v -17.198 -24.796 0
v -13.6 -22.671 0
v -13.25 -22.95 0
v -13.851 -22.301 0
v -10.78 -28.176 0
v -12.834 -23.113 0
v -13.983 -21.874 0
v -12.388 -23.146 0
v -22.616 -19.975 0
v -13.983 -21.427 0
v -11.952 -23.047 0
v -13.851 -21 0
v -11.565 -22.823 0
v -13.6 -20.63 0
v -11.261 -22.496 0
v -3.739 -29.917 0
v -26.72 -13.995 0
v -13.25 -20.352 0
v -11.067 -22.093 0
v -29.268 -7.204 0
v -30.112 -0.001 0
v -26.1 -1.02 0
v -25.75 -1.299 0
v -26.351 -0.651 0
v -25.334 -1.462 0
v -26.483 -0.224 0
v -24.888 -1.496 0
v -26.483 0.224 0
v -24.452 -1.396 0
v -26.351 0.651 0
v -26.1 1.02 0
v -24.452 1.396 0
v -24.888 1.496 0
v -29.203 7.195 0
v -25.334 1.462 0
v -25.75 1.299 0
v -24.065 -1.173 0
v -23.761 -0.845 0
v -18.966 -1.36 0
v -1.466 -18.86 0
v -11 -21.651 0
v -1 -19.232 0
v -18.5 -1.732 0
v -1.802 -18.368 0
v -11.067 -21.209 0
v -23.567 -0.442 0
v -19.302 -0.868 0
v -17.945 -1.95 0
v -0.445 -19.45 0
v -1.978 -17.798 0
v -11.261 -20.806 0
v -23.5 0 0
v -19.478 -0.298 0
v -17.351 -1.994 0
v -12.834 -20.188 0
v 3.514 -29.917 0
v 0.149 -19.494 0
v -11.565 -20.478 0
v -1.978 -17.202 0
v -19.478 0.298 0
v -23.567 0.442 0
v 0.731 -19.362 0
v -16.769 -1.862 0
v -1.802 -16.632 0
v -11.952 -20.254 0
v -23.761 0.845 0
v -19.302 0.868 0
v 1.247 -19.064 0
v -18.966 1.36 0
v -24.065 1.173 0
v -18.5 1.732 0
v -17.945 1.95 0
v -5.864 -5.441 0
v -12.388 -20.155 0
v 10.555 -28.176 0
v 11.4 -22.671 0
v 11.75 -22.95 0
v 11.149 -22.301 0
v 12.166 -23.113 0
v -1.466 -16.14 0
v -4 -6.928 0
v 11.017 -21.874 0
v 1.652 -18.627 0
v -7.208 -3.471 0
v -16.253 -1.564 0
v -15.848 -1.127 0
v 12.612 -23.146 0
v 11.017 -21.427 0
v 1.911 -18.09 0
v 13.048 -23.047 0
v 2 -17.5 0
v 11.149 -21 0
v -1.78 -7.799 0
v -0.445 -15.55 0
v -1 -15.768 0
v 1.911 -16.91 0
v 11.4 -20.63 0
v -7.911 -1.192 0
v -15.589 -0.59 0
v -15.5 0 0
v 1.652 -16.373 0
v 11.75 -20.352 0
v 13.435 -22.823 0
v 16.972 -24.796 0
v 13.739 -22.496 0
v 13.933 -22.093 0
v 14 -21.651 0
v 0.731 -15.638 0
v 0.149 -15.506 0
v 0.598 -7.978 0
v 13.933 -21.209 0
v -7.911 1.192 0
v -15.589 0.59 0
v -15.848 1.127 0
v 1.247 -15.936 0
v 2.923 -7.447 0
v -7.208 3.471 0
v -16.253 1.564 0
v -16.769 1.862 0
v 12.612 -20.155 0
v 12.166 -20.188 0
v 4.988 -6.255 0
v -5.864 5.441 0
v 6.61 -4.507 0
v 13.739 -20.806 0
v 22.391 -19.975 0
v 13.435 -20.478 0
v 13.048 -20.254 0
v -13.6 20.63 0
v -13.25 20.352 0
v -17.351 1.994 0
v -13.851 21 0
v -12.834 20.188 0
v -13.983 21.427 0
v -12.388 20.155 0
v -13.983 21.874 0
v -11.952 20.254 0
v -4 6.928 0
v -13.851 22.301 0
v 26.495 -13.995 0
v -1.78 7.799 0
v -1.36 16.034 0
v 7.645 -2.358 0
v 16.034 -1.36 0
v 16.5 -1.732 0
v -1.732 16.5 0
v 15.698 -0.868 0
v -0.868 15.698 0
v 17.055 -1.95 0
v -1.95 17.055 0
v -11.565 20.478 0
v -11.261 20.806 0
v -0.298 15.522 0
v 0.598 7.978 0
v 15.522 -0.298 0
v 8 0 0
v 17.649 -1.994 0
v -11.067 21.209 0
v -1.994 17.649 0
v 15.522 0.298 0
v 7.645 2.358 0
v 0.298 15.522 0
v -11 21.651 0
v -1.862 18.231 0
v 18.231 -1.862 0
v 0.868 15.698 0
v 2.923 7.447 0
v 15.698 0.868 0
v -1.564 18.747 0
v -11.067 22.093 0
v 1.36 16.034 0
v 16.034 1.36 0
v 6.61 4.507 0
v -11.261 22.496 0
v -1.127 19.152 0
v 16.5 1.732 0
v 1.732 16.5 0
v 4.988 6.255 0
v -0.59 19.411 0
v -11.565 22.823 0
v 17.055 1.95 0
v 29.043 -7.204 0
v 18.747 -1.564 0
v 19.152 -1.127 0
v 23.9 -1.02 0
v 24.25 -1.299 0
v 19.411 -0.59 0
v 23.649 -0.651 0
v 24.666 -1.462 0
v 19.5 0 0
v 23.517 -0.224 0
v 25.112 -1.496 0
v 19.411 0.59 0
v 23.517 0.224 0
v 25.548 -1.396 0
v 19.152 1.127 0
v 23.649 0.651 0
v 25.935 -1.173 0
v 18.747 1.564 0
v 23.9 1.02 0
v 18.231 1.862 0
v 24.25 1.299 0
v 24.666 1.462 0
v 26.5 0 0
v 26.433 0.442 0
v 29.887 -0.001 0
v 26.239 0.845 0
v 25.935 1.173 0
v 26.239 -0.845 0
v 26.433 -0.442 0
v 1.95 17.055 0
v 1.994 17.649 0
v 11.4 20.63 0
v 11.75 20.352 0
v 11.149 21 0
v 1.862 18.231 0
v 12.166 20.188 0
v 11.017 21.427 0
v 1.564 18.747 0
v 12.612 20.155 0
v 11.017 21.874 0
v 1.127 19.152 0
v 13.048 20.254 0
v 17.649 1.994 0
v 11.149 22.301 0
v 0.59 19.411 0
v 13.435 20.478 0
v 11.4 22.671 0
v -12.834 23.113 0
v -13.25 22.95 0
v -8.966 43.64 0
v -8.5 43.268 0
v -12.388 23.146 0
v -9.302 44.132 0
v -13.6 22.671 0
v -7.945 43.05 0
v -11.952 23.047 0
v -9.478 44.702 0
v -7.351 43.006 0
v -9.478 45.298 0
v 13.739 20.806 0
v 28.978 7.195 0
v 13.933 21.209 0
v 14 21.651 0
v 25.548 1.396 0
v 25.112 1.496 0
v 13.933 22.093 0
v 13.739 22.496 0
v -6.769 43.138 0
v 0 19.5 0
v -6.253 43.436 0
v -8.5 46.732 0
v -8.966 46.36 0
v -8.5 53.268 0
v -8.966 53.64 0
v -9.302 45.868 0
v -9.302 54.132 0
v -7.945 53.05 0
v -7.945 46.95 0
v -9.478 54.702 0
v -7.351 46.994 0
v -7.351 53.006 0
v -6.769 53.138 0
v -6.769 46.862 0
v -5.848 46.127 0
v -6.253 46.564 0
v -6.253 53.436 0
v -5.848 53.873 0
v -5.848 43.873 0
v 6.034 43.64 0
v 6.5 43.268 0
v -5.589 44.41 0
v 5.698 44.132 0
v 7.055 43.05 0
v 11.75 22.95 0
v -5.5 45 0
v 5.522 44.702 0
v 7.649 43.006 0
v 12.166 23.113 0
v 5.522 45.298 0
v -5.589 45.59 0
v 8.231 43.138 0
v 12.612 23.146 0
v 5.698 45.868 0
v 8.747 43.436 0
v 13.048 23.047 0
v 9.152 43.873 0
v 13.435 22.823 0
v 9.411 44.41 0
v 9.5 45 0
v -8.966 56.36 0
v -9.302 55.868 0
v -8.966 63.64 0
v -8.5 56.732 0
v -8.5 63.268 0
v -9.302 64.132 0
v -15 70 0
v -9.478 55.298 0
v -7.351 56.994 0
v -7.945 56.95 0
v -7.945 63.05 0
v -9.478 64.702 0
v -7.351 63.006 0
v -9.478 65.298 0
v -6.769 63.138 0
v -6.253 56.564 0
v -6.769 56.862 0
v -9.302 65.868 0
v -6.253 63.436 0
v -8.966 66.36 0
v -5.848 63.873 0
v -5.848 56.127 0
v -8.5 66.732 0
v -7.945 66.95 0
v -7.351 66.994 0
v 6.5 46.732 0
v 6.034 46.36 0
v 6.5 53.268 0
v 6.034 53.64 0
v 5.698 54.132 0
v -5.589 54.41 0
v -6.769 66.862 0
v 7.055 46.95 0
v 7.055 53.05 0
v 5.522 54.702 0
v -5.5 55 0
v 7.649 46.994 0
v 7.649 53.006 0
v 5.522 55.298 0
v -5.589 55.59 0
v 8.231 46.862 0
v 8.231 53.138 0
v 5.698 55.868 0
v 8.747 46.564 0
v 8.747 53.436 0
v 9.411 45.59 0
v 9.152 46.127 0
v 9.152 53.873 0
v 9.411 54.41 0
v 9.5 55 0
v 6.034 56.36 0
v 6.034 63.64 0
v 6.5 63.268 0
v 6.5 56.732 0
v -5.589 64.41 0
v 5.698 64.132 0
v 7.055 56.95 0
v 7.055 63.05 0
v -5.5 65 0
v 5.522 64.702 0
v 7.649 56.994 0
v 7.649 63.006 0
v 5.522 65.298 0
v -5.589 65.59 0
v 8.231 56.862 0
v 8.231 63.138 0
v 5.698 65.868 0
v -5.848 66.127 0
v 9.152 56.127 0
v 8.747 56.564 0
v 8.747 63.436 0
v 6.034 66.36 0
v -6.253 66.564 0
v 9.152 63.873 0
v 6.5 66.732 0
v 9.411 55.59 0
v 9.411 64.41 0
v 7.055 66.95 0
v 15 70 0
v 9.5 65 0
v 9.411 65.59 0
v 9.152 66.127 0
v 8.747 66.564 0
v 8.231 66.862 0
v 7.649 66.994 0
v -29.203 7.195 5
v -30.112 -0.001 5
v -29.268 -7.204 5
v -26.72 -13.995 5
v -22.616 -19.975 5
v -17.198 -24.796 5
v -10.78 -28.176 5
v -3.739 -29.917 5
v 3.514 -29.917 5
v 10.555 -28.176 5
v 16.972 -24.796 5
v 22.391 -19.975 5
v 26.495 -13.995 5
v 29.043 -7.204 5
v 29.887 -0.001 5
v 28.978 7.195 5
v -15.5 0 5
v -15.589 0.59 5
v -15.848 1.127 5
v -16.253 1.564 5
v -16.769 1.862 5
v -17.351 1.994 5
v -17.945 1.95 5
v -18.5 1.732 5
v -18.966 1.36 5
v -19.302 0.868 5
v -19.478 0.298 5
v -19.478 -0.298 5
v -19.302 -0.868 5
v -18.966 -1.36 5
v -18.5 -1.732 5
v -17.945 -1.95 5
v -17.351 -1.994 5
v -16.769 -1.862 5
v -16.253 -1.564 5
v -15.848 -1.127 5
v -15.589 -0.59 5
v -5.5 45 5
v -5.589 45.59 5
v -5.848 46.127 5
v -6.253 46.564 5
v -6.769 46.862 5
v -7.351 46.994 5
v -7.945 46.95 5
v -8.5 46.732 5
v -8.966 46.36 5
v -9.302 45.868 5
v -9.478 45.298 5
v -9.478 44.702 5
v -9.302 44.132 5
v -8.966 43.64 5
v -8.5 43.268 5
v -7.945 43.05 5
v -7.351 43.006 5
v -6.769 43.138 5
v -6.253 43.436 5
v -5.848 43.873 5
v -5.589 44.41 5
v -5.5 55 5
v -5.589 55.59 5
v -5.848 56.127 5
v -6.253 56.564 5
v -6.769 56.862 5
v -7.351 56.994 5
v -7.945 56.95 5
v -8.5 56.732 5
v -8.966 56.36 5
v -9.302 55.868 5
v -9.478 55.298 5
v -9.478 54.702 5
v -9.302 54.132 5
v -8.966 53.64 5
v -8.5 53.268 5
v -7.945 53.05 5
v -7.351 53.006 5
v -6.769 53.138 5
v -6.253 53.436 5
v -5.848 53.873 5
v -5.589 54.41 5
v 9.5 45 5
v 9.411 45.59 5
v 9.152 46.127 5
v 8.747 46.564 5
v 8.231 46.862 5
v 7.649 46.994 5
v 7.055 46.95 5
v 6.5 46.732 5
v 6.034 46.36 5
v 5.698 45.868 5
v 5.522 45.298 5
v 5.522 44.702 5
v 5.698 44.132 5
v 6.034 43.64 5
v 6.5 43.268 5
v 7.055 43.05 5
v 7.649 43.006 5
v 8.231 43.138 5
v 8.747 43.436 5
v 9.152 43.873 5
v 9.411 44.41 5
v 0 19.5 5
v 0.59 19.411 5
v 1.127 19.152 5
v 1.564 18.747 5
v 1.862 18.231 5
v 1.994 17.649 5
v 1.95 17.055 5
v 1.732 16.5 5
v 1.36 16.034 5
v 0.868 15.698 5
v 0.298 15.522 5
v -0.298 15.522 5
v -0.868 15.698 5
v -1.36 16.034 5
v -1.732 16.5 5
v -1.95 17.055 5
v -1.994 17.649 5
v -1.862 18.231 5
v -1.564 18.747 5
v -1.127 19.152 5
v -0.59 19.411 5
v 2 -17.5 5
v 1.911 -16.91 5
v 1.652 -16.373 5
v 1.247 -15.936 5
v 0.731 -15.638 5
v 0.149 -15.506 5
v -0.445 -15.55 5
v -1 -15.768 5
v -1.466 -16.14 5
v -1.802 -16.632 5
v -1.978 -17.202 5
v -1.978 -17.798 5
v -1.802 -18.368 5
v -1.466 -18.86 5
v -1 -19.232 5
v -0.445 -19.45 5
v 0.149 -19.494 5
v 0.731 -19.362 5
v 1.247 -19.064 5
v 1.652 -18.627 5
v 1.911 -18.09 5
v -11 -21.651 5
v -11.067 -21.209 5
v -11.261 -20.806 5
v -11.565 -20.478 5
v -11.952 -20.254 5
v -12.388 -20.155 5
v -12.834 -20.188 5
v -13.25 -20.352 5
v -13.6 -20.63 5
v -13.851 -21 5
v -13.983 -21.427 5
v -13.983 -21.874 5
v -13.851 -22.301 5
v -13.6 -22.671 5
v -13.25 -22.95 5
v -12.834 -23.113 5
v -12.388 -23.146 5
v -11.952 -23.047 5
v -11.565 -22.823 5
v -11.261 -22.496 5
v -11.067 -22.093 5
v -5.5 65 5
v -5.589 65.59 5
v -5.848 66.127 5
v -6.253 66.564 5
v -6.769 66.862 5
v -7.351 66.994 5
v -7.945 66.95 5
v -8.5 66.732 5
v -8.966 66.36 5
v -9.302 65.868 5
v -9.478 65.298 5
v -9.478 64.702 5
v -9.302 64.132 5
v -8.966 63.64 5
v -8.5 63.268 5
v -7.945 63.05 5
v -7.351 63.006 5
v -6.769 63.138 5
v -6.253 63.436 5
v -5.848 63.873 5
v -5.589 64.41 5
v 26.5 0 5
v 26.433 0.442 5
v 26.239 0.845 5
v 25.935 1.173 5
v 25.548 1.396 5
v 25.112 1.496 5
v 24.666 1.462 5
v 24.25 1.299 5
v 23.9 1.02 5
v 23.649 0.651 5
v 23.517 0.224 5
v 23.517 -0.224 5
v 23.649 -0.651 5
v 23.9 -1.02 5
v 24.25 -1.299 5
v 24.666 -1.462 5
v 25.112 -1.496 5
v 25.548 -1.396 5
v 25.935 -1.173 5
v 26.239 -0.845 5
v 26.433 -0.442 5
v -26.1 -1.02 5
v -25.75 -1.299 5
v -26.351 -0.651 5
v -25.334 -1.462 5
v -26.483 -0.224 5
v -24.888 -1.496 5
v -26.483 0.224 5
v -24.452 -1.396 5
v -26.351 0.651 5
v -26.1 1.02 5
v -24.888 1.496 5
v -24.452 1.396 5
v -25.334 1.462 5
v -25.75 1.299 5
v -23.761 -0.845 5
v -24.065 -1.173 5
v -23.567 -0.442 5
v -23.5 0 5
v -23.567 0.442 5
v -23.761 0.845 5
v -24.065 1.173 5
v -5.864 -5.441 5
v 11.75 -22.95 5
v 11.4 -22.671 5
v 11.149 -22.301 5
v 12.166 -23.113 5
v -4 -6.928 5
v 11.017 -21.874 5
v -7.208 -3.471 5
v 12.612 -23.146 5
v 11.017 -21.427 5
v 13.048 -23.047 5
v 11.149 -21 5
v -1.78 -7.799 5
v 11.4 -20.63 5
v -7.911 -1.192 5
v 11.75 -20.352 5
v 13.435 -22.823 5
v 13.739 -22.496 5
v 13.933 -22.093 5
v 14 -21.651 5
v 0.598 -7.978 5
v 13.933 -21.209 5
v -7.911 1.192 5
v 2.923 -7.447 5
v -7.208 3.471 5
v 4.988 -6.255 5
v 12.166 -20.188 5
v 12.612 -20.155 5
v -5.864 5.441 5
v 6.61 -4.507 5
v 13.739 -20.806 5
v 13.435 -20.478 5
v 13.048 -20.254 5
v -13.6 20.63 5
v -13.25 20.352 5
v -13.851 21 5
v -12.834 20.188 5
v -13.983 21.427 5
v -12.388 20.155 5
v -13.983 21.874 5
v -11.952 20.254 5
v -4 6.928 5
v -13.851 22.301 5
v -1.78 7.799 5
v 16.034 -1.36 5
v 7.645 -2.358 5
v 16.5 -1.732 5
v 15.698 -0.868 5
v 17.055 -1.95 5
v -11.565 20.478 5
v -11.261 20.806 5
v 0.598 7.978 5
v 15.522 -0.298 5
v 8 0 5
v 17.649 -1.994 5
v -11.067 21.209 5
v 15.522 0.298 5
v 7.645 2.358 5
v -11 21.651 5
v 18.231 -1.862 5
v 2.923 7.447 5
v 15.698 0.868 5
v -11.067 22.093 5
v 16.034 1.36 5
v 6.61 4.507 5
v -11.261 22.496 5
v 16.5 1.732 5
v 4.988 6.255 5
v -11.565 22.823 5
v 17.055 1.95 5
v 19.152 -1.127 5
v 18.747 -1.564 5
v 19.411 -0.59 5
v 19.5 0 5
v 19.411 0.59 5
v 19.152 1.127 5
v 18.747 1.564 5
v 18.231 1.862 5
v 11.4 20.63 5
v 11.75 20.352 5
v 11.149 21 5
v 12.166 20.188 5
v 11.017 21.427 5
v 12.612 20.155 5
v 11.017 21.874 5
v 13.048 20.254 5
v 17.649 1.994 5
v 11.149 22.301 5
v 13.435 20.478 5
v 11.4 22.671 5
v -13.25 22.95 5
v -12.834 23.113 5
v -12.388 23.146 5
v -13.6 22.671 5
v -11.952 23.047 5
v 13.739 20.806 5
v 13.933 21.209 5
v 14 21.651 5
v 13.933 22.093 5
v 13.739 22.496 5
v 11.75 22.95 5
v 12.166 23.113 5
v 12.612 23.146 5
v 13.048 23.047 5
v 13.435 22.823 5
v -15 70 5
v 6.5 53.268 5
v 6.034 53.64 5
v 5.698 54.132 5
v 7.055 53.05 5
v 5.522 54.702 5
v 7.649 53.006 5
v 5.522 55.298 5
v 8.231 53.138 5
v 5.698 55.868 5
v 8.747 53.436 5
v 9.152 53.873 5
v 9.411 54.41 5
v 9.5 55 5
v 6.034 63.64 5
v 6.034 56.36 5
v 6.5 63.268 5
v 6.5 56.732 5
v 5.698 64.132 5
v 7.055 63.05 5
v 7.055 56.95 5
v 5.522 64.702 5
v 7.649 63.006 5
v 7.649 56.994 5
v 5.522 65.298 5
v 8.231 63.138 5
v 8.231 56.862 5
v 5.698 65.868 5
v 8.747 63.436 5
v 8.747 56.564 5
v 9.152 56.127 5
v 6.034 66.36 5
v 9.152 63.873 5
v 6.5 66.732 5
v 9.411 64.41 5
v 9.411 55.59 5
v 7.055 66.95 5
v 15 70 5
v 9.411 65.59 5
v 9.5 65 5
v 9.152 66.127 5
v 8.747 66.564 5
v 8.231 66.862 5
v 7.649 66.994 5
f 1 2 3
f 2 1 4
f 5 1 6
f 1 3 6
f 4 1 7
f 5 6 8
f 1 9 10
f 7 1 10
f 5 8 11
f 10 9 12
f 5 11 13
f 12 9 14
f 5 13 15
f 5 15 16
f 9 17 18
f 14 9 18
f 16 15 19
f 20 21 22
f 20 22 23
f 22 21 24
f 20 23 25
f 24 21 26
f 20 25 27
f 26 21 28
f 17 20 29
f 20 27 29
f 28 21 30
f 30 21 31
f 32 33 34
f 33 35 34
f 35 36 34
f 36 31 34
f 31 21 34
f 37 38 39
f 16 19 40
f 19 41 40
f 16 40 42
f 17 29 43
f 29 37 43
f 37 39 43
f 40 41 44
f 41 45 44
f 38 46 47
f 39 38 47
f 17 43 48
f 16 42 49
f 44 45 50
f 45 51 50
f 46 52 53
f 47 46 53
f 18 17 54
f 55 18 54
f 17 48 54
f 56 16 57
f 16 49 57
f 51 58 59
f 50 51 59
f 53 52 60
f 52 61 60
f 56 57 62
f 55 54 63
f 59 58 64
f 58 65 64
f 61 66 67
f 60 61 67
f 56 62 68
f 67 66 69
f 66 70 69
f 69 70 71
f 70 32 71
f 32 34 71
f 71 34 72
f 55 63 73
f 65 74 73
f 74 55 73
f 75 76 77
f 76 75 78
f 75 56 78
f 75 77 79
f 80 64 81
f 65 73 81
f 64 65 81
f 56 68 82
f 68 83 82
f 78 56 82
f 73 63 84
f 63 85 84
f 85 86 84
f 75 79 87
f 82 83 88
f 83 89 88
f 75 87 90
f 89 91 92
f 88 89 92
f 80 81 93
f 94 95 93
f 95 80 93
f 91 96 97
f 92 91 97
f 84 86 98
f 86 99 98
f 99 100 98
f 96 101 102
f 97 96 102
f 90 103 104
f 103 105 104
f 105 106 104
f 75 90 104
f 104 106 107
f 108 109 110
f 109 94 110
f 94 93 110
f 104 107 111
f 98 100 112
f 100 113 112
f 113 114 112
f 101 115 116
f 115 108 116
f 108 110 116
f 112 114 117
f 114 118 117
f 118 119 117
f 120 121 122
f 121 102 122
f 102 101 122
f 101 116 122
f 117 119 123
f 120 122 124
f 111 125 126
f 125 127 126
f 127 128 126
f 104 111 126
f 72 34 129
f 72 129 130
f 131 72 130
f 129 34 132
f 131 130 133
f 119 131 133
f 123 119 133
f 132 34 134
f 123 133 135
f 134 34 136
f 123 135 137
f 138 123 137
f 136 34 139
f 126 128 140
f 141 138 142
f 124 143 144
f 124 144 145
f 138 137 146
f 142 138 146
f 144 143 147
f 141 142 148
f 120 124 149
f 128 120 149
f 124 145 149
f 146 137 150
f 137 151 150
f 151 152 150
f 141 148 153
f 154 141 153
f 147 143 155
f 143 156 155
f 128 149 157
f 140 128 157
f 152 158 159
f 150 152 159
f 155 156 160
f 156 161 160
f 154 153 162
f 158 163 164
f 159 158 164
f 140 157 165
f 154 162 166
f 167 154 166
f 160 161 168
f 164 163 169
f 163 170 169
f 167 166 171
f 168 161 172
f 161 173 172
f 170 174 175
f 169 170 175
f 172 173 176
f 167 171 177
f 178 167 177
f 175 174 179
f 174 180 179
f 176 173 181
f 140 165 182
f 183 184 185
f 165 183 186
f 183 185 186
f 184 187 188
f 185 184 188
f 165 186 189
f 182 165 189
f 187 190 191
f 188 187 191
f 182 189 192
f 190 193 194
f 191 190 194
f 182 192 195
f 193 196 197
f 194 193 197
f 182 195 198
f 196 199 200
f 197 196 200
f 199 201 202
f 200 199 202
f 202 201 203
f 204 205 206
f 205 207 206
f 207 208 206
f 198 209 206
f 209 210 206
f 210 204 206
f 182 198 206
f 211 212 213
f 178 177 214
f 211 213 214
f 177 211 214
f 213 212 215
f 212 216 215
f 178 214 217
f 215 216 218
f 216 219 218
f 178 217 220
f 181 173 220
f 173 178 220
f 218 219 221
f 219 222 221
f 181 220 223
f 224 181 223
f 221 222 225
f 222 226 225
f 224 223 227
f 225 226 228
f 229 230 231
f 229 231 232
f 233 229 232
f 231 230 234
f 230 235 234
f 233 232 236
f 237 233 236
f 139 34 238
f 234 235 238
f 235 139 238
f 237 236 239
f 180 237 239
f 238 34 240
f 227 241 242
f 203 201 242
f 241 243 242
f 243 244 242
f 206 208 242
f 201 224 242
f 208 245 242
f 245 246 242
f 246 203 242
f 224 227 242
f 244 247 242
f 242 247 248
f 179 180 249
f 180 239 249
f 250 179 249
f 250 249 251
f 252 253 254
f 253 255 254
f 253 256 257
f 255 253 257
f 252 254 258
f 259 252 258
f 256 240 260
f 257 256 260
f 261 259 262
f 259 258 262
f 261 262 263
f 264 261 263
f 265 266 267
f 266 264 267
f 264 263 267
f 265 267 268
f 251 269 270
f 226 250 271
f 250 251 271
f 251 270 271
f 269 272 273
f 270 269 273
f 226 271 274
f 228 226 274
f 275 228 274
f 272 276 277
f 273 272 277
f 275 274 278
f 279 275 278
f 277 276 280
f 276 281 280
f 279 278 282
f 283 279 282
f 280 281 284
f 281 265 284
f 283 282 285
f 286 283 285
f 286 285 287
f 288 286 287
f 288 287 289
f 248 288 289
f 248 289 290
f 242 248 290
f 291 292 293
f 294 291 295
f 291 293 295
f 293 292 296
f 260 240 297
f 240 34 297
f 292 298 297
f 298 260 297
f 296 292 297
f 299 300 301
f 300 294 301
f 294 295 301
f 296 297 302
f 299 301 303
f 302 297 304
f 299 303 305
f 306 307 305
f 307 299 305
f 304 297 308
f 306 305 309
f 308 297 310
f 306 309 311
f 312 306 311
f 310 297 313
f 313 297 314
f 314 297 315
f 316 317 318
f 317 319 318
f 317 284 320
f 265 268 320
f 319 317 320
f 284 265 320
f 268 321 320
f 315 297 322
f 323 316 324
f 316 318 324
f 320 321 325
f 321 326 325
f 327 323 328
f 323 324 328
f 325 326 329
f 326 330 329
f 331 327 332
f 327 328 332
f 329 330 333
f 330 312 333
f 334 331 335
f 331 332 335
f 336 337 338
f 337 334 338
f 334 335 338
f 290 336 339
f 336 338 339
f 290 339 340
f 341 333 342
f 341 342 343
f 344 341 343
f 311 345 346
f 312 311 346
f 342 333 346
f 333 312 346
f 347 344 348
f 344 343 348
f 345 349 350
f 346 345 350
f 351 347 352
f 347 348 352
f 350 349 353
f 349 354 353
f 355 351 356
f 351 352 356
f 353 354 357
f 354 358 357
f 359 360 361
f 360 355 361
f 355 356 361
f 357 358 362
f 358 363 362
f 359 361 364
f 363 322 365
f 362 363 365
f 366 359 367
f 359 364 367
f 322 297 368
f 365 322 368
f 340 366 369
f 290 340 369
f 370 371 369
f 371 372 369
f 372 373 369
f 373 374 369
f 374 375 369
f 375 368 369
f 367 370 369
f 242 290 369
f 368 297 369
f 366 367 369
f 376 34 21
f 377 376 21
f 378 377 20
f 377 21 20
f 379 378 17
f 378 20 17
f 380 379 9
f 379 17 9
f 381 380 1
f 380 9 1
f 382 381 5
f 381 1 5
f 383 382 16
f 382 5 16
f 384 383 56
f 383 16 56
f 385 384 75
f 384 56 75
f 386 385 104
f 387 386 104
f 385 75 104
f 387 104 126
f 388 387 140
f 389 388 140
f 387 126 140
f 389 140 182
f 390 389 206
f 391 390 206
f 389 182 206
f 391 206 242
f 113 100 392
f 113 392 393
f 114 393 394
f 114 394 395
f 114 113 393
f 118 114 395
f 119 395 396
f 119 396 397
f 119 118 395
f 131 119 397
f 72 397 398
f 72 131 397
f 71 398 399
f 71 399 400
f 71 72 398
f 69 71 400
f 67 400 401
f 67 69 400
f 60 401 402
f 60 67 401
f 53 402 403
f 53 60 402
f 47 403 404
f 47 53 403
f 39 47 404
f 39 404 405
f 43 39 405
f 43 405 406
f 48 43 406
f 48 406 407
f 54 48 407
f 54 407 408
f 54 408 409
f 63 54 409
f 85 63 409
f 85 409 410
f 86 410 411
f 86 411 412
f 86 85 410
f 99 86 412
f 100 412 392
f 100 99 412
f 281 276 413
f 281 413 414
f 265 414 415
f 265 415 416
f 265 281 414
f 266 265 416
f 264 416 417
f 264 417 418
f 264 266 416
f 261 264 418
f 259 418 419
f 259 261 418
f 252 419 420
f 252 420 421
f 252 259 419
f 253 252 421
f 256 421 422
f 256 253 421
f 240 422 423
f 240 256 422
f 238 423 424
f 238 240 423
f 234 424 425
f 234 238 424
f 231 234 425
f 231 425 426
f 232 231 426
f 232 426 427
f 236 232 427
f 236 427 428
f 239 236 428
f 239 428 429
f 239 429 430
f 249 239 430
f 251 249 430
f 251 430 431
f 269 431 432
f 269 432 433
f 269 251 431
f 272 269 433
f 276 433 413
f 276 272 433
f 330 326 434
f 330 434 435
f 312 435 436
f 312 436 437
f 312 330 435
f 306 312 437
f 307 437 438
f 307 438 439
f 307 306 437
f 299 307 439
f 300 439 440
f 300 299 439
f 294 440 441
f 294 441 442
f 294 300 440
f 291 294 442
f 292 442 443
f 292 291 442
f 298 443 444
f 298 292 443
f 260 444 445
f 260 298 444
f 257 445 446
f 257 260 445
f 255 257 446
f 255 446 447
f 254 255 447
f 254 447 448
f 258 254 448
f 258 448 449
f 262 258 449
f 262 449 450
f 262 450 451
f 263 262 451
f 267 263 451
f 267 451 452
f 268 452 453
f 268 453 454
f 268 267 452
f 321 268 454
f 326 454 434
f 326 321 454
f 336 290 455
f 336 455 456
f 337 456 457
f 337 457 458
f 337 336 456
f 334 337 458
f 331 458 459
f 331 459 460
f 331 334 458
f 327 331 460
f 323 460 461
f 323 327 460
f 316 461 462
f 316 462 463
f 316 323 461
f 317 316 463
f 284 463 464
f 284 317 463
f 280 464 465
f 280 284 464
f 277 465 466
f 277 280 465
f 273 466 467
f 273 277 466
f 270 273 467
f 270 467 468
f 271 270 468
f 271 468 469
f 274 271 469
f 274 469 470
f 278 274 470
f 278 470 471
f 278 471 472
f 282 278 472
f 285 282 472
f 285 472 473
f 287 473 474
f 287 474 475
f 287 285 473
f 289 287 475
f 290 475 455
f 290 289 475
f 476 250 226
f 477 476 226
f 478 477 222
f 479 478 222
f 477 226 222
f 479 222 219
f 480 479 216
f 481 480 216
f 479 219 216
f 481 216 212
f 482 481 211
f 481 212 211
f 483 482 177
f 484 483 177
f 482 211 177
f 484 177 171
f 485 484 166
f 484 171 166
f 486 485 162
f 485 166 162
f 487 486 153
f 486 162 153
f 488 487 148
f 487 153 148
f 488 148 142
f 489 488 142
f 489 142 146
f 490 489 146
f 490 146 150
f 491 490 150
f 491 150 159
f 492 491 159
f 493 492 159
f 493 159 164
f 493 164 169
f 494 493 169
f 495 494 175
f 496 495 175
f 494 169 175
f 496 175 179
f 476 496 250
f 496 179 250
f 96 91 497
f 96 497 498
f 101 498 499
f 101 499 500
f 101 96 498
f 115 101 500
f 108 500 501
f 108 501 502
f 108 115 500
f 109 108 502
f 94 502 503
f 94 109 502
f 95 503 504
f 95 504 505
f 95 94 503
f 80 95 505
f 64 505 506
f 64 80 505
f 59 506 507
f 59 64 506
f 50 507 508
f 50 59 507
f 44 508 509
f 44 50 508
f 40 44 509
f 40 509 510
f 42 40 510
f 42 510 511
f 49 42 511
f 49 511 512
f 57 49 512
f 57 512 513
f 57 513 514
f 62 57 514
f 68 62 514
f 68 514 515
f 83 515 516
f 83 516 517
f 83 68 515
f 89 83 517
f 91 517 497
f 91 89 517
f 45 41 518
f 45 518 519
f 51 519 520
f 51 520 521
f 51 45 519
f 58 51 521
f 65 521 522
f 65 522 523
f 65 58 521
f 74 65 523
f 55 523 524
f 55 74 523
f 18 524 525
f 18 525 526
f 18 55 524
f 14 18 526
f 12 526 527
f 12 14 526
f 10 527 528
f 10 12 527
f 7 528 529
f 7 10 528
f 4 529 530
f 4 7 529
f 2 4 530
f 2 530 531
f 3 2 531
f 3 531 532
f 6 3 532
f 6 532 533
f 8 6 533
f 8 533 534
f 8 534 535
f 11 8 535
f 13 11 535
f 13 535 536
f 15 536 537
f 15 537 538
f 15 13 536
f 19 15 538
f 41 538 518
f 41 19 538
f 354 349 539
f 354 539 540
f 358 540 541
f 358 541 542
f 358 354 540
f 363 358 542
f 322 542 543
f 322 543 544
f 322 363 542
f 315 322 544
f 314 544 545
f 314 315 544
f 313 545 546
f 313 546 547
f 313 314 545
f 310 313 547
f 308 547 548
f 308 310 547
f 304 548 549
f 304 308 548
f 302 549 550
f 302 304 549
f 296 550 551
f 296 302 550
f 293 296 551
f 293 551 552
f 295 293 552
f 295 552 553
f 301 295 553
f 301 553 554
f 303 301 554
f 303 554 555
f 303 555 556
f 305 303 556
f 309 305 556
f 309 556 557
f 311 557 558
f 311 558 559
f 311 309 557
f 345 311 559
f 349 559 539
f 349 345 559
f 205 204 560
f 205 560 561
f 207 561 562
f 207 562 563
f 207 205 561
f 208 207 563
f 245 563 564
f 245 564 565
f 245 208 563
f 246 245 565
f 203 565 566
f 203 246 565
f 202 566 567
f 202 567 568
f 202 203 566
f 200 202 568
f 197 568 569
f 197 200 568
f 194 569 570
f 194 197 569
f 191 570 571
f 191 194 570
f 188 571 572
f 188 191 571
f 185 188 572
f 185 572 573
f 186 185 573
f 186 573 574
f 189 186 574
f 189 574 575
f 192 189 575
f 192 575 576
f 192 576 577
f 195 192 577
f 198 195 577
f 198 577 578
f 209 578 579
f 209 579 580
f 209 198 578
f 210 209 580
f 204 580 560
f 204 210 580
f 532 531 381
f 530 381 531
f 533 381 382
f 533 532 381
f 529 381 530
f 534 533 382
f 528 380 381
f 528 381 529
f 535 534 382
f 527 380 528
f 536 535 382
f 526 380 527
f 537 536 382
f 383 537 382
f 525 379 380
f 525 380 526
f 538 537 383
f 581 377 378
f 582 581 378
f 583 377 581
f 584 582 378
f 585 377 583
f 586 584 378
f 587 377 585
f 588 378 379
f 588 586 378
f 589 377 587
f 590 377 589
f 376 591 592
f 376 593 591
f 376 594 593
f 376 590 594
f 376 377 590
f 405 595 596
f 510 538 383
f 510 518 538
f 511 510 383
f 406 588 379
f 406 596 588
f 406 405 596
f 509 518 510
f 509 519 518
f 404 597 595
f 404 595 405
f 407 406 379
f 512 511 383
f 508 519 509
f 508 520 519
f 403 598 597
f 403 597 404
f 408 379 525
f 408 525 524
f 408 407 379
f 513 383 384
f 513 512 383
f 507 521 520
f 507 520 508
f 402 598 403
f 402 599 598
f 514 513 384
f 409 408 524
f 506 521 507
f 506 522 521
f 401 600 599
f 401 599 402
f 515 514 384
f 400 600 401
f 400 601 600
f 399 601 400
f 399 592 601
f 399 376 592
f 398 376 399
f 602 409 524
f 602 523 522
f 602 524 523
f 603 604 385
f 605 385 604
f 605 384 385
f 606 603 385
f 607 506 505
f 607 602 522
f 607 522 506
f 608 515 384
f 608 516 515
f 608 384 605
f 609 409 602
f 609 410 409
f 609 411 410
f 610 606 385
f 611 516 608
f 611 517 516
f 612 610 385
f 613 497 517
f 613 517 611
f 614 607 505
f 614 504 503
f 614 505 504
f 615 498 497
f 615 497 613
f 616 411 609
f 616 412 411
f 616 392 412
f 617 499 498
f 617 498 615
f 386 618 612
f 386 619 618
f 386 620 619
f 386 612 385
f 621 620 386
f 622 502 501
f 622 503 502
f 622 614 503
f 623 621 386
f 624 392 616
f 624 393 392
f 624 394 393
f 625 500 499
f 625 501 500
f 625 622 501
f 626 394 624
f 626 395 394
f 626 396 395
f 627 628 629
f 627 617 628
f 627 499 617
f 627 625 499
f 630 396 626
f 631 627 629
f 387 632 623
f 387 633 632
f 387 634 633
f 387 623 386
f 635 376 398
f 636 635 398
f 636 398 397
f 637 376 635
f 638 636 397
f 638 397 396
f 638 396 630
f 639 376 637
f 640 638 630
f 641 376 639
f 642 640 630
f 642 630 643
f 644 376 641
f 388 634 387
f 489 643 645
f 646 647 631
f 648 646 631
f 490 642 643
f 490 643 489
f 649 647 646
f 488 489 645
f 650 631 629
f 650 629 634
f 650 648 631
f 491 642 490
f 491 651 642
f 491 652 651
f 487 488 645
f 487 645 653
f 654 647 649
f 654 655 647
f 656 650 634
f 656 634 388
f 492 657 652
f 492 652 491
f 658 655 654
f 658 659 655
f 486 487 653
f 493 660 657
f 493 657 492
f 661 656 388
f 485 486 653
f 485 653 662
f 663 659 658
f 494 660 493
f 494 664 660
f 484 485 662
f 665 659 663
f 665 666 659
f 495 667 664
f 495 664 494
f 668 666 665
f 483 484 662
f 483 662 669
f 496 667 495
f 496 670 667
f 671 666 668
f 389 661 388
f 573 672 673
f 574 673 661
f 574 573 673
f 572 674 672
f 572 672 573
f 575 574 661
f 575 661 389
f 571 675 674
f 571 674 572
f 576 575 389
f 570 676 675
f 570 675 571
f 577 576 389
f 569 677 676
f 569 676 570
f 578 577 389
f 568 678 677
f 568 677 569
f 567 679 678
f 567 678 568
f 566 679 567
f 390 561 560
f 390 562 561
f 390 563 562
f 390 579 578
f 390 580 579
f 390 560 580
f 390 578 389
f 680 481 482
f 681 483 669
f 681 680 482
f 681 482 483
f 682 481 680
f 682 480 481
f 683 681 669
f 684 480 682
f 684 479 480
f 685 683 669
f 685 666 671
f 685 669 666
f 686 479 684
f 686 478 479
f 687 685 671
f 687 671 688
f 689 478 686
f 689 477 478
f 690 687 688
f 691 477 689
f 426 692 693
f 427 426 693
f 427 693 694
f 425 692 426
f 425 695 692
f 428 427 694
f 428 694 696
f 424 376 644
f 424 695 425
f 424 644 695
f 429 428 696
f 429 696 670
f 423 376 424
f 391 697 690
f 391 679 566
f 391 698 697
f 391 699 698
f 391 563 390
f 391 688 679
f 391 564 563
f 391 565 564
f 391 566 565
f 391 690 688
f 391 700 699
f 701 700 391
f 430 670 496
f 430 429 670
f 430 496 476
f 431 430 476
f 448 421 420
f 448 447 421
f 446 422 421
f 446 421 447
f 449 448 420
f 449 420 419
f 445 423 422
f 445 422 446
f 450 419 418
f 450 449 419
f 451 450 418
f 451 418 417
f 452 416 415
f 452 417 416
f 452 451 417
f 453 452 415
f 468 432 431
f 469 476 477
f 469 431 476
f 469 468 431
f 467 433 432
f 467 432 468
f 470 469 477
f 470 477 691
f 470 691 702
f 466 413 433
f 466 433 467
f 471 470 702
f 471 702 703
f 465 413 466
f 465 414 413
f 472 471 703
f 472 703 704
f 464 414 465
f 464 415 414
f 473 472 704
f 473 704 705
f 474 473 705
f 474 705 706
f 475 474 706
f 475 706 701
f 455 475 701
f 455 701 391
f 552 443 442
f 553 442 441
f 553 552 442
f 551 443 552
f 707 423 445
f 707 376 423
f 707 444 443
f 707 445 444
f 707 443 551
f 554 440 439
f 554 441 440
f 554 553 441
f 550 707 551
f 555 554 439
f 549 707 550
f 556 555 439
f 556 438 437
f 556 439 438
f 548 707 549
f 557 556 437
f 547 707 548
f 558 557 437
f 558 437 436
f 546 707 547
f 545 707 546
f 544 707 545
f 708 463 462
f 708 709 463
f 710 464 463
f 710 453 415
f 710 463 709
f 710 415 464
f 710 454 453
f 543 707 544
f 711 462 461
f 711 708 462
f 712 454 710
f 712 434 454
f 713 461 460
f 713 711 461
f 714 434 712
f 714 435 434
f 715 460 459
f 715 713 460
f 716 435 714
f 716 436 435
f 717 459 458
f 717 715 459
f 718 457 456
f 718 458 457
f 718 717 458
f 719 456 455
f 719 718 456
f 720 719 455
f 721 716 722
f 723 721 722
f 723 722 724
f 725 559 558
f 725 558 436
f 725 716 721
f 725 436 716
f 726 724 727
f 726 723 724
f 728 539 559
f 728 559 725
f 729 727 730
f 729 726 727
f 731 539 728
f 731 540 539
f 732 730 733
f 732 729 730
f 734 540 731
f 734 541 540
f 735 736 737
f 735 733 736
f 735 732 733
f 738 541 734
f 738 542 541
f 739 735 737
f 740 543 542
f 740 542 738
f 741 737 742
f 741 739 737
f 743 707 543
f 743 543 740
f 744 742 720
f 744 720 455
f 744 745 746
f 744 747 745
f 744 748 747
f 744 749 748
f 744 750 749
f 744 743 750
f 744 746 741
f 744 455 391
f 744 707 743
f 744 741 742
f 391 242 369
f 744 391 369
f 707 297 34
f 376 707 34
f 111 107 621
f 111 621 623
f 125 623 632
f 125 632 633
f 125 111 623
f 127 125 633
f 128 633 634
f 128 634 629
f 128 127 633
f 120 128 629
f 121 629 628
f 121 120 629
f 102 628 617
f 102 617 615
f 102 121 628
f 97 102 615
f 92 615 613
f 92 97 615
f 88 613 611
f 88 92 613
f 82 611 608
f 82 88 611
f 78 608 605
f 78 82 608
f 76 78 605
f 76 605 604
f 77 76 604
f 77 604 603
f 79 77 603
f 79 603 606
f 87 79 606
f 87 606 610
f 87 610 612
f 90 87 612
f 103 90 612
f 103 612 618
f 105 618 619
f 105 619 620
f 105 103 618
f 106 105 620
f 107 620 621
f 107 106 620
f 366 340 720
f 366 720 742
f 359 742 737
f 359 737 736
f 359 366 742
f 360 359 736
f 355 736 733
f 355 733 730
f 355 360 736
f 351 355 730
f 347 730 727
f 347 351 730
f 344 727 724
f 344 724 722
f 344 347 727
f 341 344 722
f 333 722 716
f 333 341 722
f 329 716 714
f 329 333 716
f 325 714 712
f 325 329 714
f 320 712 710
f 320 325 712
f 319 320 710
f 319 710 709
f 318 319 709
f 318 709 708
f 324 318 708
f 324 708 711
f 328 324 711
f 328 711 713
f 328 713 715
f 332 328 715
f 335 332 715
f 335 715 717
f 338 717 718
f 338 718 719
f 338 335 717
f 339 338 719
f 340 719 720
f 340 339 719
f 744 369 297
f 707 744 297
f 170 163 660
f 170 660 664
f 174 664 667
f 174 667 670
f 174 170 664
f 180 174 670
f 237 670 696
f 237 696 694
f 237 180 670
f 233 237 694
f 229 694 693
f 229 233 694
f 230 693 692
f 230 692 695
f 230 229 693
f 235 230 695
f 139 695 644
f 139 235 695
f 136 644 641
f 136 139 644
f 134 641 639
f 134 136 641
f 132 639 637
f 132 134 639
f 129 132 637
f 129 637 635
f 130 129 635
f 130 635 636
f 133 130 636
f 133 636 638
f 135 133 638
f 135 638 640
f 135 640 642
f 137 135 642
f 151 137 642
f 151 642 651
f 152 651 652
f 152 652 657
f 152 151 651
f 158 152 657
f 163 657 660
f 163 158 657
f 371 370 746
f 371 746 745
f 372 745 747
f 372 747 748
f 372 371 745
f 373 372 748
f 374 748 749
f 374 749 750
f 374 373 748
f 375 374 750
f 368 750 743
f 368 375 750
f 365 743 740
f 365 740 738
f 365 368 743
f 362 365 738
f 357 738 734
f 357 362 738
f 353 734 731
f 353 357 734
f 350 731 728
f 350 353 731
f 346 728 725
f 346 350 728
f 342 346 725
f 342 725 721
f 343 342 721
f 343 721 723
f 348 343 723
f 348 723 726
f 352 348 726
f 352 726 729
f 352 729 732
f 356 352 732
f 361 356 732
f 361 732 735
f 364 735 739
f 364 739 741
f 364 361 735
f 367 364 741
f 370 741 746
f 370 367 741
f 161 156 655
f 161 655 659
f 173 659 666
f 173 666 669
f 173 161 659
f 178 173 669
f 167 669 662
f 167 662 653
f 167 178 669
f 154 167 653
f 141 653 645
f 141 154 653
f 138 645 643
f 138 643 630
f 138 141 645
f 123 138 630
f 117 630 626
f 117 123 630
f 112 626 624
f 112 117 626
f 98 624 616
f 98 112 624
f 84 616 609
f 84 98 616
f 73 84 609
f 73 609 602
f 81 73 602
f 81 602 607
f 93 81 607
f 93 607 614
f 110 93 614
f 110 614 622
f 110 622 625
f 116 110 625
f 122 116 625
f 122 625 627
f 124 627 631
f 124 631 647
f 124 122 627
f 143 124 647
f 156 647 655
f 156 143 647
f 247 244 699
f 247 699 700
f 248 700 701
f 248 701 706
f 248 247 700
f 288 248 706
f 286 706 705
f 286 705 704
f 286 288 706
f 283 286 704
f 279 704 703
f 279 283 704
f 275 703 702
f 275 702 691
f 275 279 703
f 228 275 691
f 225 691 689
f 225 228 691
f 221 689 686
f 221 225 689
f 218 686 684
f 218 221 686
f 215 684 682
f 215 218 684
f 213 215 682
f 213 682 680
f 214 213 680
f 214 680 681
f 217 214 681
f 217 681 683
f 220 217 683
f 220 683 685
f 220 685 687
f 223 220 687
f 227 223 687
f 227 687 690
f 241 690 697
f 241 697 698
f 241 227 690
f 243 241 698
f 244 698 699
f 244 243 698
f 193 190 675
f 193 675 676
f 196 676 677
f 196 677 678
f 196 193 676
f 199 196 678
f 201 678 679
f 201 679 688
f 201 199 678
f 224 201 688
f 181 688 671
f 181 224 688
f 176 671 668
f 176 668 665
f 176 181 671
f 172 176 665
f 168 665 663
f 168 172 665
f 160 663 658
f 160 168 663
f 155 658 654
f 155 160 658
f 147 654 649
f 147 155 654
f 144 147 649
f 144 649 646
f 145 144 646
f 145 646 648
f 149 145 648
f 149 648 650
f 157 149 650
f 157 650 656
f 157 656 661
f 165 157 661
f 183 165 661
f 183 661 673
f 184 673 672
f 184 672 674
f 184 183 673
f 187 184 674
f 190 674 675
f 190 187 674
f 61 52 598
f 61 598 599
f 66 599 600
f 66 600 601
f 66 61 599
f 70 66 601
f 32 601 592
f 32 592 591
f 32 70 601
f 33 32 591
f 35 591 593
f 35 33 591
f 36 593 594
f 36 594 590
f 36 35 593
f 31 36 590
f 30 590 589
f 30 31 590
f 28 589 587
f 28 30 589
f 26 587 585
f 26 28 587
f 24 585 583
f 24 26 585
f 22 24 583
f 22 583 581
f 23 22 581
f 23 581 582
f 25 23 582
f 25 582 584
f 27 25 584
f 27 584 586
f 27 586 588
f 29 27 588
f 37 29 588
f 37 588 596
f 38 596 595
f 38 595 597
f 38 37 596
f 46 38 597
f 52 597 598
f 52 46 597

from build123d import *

# Parameters (mm, degrees)
SKETCH1_R           = 1.5
SKETCH1_R_2         = 2
SKETCH1_R_3         = 8
BOSS_EXTRUDE1_DEPTH = 5


with BuildPart() as part:
    # Sketch1 → Boss-Extrude1 (new body)
    with BuildSketch(Plane.XY):
        with BuildLine():
            Line((-15, 70), (-29.20308374, 7.195041803))
            ThreePointArc((-29.20308374, 7.195041803), (-0.112734709, -30.136506004), (28.977614322, 7.195041803))
            Line((28.977614322, 7.195041803), (15, 70))
            Line((15, 70), (-15, 70))
        make_face()
        with Locations((-12.5, -21.650635095)):
            Circle(SKETCH1_R, mode=Mode.SUBTRACT)
        with Locations((0, -17.5)):
            Circle(SKETCH1_R_2, mode=Mode.SUBTRACT)
        with Locations((-25, 0)):
            Circle(SKETCH1_R, mode=Mode.SUBTRACT)
        with Locations((-17.5, 0)):
            Circle(SKETCH1_R_2, mode=Mode.SUBTRACT)
        with Locations((-12.5, 21.650635095)):
            Circle(SKETCH1_R, mode=Mode.SUBTRACT)
        with Locations((12.5, -21.650635095)):
            Circle(SKETCH1_R, mode=Mode.SUBTRACT)
        Circle(SKETCH1_R_3, mode=Mode.SUBTRACT)
        with BuildLine():
            ThreePointArc((0, 15.5), (-2, 17.5), (0, 19.5))
            ThreePointArc((0, 19.5), (2, 17.5), (0, 15.5))
        make_face(mode=Mode.SUBTRACT)
        with Locations((12.5, 21.650635095)):
            Circle(SKETCH1_R, mode=Mode.SUBTRACT)
        with Locations((17.5, 0)):
            Circle(SKETCH1_R_2, mode=Mode.SUBTRACT)
        with Locations((25, 0)):
            Circle(SKETCH1_R, mode=Mode.SUBTRACT)
        with Locations((-7.5, 45)):
            Circle(SKETCH1_R_2, mode=Mode.SUBTRACT)
        with Locations((-7.5, 55)):
            Circle(SKETCH1_R_2, mode=Mode.SUBTRACT)
        with Locations((-7.5, 65)):
            Circle(SKETCH1_R_2, mode=Mode.SUBTRACT)
        with Locations((7.5, 65)):
            Circle(SKETCH1_R_2, mode=Mode.SUBTRACT)
        with Locations((7.5, 55)):
            Circle(SKETCH1_R_2, mode=Mode.SUBTRACT)
        with Locations((7.5, 45)):
            Circle(SKETCH1_R_2, mode=Mode.SUBTRACT)
    extrude(amount=BOSS_EXTRUDE1_DEPTH)


solid = part.part
